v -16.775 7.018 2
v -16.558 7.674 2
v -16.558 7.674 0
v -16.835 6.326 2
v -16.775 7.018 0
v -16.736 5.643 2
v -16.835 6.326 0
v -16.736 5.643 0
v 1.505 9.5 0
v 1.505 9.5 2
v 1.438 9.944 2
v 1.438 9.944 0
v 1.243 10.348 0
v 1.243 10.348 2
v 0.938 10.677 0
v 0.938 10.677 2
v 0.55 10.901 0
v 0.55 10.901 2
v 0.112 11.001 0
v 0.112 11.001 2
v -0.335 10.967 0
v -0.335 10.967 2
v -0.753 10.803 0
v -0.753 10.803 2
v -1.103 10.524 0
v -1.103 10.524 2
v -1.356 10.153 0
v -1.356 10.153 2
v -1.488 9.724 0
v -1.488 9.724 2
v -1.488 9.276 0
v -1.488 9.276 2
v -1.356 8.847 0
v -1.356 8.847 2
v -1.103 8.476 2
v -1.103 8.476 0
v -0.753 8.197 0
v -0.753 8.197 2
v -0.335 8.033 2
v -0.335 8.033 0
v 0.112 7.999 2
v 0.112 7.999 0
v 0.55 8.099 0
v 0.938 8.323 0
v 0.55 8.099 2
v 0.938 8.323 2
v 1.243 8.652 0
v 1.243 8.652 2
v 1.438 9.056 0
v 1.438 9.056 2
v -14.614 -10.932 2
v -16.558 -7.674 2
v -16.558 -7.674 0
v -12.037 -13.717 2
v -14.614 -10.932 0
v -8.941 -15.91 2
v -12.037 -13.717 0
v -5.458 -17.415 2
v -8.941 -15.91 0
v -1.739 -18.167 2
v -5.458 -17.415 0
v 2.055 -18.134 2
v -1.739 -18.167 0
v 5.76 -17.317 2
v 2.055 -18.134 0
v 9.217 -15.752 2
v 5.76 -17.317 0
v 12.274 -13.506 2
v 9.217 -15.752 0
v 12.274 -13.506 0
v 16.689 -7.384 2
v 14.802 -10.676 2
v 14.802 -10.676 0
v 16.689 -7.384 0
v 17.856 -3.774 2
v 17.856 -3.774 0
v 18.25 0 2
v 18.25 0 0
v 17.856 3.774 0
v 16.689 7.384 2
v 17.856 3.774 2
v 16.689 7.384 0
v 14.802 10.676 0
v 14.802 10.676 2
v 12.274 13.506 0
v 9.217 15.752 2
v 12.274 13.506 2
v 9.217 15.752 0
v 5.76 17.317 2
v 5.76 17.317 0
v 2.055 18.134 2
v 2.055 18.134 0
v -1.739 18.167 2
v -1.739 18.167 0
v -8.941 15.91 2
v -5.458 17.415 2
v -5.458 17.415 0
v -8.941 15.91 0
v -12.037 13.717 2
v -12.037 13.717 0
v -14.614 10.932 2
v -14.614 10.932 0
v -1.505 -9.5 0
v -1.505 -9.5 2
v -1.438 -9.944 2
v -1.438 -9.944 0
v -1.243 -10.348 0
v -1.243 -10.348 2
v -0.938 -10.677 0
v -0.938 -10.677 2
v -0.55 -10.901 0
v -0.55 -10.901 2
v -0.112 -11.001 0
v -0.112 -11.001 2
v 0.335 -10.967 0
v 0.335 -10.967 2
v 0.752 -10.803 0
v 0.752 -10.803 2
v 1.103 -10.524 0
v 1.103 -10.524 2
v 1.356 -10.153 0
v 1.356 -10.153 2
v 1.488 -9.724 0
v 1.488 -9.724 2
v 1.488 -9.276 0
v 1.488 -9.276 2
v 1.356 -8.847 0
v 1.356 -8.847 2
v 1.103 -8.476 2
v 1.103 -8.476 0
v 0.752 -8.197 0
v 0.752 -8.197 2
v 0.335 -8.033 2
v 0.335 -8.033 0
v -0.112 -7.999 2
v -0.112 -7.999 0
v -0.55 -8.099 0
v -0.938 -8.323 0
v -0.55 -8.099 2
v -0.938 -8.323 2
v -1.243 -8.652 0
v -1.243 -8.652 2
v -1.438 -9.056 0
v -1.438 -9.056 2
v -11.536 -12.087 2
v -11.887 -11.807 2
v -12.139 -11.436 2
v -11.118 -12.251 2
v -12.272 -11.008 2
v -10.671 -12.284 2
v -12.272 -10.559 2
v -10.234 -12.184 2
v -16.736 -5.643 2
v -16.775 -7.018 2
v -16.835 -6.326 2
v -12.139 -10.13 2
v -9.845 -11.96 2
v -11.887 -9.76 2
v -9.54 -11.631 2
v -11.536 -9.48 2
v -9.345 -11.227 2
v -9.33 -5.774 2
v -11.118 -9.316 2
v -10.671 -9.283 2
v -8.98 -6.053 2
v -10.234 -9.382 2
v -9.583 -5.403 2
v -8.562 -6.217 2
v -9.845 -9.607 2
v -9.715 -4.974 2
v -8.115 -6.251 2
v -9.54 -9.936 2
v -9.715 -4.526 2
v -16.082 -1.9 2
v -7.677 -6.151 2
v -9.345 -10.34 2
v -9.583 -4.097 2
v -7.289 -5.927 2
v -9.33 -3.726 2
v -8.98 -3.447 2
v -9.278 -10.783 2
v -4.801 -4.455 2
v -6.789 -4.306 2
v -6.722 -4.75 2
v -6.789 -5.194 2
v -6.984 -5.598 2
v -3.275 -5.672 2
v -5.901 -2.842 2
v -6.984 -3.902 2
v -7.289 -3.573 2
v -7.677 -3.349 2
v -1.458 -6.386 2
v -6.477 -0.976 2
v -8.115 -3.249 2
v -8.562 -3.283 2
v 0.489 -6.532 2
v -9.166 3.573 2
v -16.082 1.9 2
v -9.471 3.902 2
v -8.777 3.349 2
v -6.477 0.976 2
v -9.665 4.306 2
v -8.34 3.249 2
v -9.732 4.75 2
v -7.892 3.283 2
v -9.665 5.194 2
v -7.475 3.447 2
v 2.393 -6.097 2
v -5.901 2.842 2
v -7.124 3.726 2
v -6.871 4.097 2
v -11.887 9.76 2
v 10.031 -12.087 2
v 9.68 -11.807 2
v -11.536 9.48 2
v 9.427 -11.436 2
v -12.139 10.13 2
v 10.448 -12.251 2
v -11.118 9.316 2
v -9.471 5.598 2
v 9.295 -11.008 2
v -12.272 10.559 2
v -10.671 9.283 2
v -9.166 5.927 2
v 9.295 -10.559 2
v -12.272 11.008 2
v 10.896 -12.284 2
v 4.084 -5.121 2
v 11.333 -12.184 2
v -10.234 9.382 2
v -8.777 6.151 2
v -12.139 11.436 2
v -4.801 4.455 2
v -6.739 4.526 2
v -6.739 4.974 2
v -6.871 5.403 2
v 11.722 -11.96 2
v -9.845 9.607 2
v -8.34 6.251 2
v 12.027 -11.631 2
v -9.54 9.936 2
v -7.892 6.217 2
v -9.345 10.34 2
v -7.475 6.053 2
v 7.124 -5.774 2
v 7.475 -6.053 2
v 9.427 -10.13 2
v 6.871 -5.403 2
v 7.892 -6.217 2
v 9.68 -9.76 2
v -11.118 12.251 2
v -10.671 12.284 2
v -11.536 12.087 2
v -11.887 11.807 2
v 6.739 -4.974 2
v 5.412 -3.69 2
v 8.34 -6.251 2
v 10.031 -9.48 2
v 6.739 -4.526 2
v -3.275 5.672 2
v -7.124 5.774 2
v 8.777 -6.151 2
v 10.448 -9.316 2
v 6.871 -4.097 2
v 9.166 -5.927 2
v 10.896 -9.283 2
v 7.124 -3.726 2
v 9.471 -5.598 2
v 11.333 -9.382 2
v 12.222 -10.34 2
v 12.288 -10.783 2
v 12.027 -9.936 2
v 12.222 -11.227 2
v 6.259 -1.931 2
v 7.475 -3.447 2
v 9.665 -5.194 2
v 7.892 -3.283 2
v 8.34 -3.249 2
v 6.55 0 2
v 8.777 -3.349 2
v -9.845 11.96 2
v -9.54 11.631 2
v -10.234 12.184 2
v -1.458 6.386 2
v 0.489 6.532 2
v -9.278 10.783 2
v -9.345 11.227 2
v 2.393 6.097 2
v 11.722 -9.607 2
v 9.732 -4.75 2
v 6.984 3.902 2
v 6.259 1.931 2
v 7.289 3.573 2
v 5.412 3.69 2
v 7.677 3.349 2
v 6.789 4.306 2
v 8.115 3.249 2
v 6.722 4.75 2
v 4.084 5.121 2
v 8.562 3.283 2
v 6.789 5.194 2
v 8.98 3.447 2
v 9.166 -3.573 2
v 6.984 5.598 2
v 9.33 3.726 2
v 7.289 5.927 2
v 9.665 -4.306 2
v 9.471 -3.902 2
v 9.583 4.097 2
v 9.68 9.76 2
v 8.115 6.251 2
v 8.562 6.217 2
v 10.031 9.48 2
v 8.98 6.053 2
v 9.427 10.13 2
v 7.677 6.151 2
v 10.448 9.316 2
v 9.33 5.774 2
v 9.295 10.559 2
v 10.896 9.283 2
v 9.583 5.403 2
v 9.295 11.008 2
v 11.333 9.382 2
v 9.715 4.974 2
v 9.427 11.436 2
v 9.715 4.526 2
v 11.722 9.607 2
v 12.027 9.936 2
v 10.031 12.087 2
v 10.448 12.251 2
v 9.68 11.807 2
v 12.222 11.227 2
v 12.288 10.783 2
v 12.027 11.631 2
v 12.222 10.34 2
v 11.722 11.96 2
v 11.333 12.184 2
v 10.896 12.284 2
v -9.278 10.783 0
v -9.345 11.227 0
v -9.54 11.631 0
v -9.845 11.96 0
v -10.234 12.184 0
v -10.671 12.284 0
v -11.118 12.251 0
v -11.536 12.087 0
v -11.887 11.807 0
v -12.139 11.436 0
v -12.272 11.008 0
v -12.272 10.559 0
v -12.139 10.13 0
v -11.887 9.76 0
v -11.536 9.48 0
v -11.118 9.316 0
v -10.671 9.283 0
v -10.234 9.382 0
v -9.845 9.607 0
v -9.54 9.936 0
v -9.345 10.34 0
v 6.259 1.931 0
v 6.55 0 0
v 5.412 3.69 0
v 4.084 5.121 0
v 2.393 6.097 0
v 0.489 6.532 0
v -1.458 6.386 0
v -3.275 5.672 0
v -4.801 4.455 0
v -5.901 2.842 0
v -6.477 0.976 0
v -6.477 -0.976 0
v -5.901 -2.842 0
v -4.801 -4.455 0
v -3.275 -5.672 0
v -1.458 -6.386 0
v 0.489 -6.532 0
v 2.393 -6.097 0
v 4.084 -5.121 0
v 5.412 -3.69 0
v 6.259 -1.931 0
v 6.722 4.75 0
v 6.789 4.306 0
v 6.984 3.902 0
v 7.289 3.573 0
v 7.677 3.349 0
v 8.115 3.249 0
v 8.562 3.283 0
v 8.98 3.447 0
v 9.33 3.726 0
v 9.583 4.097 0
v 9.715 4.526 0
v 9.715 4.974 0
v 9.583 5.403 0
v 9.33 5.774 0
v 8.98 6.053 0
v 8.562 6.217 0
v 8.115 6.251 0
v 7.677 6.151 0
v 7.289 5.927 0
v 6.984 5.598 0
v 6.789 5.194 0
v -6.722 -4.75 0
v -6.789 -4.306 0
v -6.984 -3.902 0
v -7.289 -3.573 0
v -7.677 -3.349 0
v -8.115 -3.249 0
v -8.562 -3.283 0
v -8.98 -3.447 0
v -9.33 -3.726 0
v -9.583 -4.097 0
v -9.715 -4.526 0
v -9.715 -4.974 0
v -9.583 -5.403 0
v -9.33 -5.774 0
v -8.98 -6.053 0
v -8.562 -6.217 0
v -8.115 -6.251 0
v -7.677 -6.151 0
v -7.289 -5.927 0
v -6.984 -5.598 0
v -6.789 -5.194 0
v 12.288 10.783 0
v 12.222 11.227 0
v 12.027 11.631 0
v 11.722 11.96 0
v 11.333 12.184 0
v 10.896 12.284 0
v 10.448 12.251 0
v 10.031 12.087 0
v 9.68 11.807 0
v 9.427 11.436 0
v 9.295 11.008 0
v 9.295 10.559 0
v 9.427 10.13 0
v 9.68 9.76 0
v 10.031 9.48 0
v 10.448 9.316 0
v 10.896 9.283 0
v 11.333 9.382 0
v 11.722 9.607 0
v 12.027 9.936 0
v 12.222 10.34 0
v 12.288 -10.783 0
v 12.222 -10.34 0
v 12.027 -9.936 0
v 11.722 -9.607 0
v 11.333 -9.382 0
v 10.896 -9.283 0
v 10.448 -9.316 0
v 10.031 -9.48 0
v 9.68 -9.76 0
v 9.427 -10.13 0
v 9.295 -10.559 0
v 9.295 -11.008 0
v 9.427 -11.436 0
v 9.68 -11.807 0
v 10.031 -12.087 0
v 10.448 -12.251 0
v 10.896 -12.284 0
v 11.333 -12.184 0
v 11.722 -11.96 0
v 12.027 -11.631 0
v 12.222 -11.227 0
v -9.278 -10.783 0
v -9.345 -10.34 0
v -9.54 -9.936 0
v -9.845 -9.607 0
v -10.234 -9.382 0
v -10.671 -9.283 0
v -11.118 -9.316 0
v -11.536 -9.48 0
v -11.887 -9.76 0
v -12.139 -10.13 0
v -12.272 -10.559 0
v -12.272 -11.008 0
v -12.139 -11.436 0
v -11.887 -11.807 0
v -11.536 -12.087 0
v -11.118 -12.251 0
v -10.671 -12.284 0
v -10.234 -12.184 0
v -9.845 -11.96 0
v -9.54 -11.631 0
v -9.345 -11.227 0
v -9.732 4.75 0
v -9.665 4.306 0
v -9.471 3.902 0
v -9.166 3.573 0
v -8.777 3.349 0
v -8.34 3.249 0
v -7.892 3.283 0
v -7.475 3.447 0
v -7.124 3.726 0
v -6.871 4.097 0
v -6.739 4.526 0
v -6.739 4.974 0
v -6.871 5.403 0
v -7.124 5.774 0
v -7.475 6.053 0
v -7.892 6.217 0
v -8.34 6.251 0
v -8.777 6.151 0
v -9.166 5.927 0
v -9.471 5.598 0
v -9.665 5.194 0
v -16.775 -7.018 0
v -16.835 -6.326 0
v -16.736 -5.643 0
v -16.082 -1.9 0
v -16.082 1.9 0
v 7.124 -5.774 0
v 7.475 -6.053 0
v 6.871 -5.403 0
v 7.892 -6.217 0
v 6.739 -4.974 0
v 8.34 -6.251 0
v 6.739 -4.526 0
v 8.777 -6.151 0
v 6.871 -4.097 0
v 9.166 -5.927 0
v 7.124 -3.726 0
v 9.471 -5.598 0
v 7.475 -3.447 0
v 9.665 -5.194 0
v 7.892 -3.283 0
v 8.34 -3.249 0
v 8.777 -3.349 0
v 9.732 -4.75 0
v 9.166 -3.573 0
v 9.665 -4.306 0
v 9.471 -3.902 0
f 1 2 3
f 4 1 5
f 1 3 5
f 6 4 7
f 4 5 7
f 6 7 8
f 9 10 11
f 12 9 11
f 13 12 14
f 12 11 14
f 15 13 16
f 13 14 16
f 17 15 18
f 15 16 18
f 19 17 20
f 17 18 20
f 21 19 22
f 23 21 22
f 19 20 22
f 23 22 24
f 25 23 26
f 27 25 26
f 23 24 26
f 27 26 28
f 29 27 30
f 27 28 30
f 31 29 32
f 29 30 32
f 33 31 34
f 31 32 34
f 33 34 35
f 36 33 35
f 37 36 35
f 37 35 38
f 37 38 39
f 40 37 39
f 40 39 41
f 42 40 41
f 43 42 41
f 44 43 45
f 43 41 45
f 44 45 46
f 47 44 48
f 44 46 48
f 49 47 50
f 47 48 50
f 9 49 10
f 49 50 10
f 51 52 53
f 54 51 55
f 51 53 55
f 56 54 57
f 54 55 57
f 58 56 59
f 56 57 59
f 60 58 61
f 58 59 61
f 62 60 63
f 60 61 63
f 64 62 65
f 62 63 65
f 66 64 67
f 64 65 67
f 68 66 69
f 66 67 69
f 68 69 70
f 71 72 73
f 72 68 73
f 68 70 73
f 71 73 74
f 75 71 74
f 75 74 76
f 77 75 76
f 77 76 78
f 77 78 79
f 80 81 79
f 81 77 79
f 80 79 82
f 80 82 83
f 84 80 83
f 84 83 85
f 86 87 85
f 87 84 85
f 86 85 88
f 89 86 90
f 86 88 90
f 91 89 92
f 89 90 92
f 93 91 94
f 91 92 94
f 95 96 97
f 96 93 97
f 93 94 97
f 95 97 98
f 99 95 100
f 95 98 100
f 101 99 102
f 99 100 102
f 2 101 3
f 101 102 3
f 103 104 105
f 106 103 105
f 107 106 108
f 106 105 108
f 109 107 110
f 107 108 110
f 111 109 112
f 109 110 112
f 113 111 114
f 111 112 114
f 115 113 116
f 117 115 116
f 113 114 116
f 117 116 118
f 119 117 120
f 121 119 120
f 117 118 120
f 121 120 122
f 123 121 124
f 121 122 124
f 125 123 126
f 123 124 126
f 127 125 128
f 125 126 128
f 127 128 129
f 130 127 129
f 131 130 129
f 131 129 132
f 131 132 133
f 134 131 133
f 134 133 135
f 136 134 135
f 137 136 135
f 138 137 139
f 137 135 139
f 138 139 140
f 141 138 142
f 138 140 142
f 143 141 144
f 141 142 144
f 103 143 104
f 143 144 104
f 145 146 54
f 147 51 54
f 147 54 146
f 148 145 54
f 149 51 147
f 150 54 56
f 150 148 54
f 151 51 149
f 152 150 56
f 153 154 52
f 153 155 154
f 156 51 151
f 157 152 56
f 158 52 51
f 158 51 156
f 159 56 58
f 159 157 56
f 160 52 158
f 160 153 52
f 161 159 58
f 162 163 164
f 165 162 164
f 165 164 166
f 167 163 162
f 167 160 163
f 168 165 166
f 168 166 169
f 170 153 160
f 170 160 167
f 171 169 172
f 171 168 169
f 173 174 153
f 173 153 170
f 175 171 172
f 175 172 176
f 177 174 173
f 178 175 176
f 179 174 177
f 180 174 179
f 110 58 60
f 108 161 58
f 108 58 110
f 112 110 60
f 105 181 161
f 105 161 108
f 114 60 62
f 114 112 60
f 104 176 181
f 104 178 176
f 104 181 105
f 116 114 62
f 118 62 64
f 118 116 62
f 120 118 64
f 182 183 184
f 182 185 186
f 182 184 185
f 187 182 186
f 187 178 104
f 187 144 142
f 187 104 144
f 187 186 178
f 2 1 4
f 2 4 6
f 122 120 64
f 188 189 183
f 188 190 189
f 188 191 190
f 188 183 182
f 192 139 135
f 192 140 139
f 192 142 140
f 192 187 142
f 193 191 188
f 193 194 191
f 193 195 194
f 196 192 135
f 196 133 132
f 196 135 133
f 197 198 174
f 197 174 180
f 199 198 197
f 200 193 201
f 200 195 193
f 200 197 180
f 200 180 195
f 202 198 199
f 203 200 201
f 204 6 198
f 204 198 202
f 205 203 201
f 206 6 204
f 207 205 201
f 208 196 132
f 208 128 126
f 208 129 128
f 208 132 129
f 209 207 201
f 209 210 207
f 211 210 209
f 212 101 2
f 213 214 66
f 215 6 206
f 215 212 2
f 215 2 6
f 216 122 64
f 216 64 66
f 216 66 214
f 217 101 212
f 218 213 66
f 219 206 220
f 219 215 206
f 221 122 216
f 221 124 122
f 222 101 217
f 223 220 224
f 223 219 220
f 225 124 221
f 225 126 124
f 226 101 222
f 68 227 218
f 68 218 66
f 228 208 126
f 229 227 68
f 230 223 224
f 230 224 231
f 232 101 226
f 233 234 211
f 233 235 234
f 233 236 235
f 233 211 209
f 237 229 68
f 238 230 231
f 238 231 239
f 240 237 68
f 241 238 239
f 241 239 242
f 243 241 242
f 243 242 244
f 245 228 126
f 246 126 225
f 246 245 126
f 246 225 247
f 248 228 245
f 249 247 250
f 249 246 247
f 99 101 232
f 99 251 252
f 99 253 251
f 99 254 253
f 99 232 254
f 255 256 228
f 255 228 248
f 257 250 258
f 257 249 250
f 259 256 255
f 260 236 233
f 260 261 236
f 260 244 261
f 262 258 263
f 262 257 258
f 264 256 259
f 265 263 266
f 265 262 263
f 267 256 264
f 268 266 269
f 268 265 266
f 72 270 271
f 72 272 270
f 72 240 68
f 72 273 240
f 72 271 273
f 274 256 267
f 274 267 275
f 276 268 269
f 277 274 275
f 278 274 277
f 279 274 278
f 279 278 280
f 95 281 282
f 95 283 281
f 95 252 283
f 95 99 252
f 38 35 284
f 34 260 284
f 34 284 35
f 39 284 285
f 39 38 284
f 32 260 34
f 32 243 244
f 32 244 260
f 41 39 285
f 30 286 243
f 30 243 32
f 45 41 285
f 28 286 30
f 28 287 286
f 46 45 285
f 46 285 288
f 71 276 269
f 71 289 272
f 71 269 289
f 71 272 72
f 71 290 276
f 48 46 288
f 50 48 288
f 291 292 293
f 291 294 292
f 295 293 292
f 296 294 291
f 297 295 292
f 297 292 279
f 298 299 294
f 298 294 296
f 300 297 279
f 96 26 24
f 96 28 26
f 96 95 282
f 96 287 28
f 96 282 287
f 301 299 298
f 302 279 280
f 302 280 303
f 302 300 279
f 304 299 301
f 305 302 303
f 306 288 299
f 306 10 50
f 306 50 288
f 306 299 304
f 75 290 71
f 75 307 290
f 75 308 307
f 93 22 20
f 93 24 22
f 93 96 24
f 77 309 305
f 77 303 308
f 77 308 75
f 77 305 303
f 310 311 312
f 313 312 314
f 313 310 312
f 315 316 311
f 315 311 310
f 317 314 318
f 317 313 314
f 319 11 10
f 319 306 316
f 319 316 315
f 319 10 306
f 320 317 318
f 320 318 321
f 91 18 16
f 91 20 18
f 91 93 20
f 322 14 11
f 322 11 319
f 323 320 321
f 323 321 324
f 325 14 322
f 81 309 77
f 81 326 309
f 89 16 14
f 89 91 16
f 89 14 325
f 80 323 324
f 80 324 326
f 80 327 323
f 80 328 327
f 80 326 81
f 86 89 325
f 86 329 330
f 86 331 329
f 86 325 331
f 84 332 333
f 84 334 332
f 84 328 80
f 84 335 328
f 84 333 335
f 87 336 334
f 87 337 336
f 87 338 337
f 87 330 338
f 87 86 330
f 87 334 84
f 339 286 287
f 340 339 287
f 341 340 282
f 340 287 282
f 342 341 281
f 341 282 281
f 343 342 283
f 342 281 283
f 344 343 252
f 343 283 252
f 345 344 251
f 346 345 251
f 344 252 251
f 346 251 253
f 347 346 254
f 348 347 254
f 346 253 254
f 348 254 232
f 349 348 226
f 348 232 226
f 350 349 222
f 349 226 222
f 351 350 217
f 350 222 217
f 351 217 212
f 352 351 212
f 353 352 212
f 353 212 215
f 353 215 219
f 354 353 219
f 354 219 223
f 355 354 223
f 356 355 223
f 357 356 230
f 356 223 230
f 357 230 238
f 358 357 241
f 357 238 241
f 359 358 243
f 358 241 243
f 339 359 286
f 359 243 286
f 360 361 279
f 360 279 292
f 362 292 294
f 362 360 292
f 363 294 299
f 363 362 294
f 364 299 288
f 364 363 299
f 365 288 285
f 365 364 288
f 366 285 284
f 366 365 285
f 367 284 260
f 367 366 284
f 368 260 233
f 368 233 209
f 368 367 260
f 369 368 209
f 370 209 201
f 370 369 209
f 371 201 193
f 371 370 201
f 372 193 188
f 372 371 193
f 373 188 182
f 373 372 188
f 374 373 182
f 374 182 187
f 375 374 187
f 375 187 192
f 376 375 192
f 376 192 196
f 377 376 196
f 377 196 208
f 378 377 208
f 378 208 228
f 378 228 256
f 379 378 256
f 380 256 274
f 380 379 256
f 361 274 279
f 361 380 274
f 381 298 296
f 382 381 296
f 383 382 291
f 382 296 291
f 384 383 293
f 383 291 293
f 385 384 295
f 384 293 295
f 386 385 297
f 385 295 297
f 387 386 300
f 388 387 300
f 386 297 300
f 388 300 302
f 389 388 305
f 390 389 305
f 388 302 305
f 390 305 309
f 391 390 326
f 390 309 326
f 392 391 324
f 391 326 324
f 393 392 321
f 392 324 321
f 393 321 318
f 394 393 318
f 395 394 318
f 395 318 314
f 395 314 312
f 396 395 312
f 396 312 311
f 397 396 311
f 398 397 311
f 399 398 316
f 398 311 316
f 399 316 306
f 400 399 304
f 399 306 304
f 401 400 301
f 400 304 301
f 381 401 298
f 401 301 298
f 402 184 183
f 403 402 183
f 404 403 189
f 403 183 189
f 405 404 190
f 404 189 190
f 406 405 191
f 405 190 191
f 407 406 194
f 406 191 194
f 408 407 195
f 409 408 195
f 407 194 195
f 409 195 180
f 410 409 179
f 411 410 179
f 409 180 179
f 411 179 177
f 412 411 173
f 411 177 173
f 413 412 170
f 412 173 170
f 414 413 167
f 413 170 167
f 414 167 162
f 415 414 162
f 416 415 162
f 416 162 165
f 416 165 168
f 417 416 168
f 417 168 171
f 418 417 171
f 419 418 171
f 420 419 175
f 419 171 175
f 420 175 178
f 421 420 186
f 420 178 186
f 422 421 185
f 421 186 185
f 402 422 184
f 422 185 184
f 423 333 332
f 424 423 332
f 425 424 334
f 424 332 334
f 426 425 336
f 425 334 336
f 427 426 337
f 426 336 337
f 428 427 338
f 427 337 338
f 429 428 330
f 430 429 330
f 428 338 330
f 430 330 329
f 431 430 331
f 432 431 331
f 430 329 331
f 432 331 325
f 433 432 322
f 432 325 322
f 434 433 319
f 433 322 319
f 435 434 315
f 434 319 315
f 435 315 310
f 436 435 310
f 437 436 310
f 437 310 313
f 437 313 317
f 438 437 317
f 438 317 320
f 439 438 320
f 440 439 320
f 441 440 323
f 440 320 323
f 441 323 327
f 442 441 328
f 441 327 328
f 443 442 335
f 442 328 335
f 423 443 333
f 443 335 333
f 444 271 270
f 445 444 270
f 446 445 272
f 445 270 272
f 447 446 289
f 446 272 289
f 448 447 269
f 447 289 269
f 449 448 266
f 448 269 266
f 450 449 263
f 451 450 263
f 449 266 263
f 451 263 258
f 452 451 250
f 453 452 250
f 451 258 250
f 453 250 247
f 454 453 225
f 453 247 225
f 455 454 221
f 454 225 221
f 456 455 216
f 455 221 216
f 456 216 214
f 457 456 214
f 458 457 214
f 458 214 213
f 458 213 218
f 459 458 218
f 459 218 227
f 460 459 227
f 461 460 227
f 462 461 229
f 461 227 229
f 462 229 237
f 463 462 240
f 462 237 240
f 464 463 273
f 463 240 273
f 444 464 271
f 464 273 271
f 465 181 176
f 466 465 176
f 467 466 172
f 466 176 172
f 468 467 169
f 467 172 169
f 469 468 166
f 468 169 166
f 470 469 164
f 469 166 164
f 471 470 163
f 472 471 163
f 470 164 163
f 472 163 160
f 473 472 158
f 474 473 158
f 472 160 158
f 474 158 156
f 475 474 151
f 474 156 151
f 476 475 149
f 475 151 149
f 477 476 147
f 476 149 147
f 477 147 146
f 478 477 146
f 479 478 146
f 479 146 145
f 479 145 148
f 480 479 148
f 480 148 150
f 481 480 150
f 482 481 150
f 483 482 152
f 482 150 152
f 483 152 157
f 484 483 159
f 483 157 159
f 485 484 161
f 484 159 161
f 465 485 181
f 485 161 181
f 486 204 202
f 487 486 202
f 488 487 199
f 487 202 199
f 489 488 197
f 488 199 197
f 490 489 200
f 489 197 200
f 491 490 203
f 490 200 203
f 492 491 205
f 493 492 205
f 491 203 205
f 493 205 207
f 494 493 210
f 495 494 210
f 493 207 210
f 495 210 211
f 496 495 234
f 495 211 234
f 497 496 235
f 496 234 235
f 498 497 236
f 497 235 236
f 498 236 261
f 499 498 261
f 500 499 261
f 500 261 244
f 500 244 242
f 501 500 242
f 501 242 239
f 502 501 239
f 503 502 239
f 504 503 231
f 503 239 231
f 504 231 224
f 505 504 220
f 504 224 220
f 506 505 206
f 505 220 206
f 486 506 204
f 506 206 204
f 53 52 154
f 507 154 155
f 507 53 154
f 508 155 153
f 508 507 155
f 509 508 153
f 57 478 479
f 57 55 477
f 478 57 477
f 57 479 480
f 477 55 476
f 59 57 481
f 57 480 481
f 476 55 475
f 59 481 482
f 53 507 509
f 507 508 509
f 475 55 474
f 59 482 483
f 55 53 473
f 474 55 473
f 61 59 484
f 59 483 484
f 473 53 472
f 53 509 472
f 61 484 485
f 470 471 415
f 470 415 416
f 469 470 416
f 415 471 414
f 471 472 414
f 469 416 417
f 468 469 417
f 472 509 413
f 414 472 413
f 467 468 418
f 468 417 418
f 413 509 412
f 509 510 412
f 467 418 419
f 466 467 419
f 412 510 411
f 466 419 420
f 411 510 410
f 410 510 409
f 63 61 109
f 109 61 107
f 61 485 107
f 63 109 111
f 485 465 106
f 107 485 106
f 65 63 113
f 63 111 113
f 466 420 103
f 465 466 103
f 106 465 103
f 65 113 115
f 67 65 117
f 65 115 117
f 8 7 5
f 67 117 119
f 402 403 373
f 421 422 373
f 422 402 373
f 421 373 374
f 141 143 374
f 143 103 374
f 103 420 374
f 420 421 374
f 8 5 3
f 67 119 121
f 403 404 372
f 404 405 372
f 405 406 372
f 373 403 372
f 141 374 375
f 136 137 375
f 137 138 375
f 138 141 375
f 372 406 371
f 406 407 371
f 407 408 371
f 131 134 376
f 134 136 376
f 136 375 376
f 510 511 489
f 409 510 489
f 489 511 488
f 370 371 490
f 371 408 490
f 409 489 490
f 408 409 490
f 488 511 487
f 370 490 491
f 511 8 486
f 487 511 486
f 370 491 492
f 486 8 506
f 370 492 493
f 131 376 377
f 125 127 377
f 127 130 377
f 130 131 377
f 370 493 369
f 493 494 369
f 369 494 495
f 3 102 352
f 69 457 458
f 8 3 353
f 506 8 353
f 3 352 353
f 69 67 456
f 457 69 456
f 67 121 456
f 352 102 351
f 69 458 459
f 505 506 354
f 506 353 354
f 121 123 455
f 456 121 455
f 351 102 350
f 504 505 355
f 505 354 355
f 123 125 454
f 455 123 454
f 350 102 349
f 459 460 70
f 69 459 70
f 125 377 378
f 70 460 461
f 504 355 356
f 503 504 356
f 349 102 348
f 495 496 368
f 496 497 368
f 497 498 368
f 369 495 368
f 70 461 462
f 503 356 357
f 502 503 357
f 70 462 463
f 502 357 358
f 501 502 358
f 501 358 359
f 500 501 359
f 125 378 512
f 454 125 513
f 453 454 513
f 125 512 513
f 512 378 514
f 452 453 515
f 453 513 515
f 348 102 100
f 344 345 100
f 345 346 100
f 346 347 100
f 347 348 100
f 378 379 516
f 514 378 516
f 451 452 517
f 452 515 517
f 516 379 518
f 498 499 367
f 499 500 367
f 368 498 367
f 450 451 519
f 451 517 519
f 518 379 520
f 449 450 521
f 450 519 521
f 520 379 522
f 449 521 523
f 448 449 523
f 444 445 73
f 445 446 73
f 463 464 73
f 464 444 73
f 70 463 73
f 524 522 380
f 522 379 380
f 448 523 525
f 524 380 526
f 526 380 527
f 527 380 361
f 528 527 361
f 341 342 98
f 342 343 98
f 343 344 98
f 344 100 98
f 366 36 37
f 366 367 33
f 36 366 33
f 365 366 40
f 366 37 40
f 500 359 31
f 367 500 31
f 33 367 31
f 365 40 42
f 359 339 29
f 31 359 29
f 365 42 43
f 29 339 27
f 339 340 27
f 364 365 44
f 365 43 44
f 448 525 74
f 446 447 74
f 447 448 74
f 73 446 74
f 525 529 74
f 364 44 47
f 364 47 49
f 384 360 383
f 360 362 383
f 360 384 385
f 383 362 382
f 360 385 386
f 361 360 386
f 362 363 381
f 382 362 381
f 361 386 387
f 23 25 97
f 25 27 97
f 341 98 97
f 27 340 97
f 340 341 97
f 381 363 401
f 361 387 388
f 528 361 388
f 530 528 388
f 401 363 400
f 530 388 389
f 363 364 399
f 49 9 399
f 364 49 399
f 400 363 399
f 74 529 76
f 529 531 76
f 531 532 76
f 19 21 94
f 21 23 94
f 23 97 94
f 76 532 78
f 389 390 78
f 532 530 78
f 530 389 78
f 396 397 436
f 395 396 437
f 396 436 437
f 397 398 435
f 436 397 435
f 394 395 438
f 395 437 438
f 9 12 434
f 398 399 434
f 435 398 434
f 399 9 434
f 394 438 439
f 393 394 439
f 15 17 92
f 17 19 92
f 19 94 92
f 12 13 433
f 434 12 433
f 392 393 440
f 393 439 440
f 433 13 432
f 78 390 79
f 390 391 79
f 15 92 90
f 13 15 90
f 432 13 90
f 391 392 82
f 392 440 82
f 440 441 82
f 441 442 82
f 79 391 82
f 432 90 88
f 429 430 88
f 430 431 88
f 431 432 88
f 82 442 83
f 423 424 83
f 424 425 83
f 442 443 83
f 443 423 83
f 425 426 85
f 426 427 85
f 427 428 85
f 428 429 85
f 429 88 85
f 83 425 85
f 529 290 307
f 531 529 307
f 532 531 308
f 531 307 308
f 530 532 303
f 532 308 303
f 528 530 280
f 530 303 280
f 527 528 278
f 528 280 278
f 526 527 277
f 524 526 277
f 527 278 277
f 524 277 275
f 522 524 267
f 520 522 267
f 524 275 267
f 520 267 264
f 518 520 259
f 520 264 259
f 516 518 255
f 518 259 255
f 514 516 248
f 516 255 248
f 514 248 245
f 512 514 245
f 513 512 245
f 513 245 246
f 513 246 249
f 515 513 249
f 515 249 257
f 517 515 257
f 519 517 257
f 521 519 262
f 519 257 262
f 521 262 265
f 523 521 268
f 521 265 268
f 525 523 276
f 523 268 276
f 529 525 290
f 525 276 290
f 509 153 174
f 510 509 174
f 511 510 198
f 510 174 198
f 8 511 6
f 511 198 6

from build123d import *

# Parameters (mm, degrees)
SKETCH_1_R               = 18.25
SKETCH_1_R_2             = 6.55
EXTRUDE_1_DEPTH          = 2
SKETCH_2_R               = 22
CUT_EXTRUDE_1_DEPTH      = 2
SKETCH_3_R               = 1.505
CUT_EXTRUDE_2_DEPTH      = 2
PATTERN_CIRCULAR_1_COUNT = 2
SKETCH_4_R               = 1.505
CUT_EXTRUDE_3_DEPTH      = 2
FILLET_1_R               = 3


with BuildPart() as part:
    # 草图1 → 凸台-拉伸1 (new body)
    with BuildSketch(Plane.XY):
        Circle(SKETCH_1_R)
        Circle(SKETCH_1_R_2, mode=Mode.SUBTRACT)
    extrude(amount=EXTRUDE_1_DEPTH)

    # 草图2 → 切除-拉伸1 (cut)
    with BuildSketch(Plane.XY.offset(2)):
        with Locations((-38, 0)):
            Circle(SKETCH_2_R)
    extrude(amount=-CUT_EXTRUDE_1_DEPTH, mode=Mode.SUBTRACT)

    # 草图3 → 切除-拉伸2 (cut)
    with BuildSketch(Plane.XY.offset(2)):
        with Locations((0, 9.5)):
            Circle(SKETCH_3_R)
        with Locations((8.227241336, -4.75)):
            Circle(SKETCH_3_R)
        with Locations((-8.227241336, -4.75)):
            Circle(SKETCH_3_R)
    cut_extrude_2 = extrude(amount=-CUT_EXTRUDE_2_DEPTH, mode=Mode.SUBTRACT)

    # 阵列(圆周)1: 切除-拉伸2 ×2 about axis
    pattern_circular_1_axis = Axis((0, 0, 0), (0, 0, 1))
    for i in range(1, PATTERN_CIRCULAR_1_COUNT):
        add(cut_extrude_2.rotate(pattern_circular_1_axis, i * 360 / PATTERN_CIRCULAR_1_COUNT), mode=Mode.SUBTRACT)

    # 草图4 → 切除-拉伸3 (cut)
    with BuildSketch(Plane.XY.offset(2)):
        with Locations((-10.783378413, 10.783378413)):
            Circle(SKETCH_4_R)
        with Locations((10.783378413, 10.783378413)):
            Circle(SKETCH_4_R)
        with Locations((10.783378413, -10.783378413)):
            Circle(SKETCH_4_R)
        with Locations((-10.783378413, -10.783378413)):
            Circle(SKETCH_4_R)
    extrude(amount=-CUT_EXTRUDE_3_DEPTH, mode=Mode.SUBTRACT)

    # 圆角1
    fillet_1_edges = [part.edges().sort_by_distance(p)[0] for p in [
        (-17.013980263, -6.60204329, 1),
        (-17.013980263, 6.60204329, 1),
    ]]
    fillet(fillet_1_edges, radius=FILLET_1_R)


solid = part.part
